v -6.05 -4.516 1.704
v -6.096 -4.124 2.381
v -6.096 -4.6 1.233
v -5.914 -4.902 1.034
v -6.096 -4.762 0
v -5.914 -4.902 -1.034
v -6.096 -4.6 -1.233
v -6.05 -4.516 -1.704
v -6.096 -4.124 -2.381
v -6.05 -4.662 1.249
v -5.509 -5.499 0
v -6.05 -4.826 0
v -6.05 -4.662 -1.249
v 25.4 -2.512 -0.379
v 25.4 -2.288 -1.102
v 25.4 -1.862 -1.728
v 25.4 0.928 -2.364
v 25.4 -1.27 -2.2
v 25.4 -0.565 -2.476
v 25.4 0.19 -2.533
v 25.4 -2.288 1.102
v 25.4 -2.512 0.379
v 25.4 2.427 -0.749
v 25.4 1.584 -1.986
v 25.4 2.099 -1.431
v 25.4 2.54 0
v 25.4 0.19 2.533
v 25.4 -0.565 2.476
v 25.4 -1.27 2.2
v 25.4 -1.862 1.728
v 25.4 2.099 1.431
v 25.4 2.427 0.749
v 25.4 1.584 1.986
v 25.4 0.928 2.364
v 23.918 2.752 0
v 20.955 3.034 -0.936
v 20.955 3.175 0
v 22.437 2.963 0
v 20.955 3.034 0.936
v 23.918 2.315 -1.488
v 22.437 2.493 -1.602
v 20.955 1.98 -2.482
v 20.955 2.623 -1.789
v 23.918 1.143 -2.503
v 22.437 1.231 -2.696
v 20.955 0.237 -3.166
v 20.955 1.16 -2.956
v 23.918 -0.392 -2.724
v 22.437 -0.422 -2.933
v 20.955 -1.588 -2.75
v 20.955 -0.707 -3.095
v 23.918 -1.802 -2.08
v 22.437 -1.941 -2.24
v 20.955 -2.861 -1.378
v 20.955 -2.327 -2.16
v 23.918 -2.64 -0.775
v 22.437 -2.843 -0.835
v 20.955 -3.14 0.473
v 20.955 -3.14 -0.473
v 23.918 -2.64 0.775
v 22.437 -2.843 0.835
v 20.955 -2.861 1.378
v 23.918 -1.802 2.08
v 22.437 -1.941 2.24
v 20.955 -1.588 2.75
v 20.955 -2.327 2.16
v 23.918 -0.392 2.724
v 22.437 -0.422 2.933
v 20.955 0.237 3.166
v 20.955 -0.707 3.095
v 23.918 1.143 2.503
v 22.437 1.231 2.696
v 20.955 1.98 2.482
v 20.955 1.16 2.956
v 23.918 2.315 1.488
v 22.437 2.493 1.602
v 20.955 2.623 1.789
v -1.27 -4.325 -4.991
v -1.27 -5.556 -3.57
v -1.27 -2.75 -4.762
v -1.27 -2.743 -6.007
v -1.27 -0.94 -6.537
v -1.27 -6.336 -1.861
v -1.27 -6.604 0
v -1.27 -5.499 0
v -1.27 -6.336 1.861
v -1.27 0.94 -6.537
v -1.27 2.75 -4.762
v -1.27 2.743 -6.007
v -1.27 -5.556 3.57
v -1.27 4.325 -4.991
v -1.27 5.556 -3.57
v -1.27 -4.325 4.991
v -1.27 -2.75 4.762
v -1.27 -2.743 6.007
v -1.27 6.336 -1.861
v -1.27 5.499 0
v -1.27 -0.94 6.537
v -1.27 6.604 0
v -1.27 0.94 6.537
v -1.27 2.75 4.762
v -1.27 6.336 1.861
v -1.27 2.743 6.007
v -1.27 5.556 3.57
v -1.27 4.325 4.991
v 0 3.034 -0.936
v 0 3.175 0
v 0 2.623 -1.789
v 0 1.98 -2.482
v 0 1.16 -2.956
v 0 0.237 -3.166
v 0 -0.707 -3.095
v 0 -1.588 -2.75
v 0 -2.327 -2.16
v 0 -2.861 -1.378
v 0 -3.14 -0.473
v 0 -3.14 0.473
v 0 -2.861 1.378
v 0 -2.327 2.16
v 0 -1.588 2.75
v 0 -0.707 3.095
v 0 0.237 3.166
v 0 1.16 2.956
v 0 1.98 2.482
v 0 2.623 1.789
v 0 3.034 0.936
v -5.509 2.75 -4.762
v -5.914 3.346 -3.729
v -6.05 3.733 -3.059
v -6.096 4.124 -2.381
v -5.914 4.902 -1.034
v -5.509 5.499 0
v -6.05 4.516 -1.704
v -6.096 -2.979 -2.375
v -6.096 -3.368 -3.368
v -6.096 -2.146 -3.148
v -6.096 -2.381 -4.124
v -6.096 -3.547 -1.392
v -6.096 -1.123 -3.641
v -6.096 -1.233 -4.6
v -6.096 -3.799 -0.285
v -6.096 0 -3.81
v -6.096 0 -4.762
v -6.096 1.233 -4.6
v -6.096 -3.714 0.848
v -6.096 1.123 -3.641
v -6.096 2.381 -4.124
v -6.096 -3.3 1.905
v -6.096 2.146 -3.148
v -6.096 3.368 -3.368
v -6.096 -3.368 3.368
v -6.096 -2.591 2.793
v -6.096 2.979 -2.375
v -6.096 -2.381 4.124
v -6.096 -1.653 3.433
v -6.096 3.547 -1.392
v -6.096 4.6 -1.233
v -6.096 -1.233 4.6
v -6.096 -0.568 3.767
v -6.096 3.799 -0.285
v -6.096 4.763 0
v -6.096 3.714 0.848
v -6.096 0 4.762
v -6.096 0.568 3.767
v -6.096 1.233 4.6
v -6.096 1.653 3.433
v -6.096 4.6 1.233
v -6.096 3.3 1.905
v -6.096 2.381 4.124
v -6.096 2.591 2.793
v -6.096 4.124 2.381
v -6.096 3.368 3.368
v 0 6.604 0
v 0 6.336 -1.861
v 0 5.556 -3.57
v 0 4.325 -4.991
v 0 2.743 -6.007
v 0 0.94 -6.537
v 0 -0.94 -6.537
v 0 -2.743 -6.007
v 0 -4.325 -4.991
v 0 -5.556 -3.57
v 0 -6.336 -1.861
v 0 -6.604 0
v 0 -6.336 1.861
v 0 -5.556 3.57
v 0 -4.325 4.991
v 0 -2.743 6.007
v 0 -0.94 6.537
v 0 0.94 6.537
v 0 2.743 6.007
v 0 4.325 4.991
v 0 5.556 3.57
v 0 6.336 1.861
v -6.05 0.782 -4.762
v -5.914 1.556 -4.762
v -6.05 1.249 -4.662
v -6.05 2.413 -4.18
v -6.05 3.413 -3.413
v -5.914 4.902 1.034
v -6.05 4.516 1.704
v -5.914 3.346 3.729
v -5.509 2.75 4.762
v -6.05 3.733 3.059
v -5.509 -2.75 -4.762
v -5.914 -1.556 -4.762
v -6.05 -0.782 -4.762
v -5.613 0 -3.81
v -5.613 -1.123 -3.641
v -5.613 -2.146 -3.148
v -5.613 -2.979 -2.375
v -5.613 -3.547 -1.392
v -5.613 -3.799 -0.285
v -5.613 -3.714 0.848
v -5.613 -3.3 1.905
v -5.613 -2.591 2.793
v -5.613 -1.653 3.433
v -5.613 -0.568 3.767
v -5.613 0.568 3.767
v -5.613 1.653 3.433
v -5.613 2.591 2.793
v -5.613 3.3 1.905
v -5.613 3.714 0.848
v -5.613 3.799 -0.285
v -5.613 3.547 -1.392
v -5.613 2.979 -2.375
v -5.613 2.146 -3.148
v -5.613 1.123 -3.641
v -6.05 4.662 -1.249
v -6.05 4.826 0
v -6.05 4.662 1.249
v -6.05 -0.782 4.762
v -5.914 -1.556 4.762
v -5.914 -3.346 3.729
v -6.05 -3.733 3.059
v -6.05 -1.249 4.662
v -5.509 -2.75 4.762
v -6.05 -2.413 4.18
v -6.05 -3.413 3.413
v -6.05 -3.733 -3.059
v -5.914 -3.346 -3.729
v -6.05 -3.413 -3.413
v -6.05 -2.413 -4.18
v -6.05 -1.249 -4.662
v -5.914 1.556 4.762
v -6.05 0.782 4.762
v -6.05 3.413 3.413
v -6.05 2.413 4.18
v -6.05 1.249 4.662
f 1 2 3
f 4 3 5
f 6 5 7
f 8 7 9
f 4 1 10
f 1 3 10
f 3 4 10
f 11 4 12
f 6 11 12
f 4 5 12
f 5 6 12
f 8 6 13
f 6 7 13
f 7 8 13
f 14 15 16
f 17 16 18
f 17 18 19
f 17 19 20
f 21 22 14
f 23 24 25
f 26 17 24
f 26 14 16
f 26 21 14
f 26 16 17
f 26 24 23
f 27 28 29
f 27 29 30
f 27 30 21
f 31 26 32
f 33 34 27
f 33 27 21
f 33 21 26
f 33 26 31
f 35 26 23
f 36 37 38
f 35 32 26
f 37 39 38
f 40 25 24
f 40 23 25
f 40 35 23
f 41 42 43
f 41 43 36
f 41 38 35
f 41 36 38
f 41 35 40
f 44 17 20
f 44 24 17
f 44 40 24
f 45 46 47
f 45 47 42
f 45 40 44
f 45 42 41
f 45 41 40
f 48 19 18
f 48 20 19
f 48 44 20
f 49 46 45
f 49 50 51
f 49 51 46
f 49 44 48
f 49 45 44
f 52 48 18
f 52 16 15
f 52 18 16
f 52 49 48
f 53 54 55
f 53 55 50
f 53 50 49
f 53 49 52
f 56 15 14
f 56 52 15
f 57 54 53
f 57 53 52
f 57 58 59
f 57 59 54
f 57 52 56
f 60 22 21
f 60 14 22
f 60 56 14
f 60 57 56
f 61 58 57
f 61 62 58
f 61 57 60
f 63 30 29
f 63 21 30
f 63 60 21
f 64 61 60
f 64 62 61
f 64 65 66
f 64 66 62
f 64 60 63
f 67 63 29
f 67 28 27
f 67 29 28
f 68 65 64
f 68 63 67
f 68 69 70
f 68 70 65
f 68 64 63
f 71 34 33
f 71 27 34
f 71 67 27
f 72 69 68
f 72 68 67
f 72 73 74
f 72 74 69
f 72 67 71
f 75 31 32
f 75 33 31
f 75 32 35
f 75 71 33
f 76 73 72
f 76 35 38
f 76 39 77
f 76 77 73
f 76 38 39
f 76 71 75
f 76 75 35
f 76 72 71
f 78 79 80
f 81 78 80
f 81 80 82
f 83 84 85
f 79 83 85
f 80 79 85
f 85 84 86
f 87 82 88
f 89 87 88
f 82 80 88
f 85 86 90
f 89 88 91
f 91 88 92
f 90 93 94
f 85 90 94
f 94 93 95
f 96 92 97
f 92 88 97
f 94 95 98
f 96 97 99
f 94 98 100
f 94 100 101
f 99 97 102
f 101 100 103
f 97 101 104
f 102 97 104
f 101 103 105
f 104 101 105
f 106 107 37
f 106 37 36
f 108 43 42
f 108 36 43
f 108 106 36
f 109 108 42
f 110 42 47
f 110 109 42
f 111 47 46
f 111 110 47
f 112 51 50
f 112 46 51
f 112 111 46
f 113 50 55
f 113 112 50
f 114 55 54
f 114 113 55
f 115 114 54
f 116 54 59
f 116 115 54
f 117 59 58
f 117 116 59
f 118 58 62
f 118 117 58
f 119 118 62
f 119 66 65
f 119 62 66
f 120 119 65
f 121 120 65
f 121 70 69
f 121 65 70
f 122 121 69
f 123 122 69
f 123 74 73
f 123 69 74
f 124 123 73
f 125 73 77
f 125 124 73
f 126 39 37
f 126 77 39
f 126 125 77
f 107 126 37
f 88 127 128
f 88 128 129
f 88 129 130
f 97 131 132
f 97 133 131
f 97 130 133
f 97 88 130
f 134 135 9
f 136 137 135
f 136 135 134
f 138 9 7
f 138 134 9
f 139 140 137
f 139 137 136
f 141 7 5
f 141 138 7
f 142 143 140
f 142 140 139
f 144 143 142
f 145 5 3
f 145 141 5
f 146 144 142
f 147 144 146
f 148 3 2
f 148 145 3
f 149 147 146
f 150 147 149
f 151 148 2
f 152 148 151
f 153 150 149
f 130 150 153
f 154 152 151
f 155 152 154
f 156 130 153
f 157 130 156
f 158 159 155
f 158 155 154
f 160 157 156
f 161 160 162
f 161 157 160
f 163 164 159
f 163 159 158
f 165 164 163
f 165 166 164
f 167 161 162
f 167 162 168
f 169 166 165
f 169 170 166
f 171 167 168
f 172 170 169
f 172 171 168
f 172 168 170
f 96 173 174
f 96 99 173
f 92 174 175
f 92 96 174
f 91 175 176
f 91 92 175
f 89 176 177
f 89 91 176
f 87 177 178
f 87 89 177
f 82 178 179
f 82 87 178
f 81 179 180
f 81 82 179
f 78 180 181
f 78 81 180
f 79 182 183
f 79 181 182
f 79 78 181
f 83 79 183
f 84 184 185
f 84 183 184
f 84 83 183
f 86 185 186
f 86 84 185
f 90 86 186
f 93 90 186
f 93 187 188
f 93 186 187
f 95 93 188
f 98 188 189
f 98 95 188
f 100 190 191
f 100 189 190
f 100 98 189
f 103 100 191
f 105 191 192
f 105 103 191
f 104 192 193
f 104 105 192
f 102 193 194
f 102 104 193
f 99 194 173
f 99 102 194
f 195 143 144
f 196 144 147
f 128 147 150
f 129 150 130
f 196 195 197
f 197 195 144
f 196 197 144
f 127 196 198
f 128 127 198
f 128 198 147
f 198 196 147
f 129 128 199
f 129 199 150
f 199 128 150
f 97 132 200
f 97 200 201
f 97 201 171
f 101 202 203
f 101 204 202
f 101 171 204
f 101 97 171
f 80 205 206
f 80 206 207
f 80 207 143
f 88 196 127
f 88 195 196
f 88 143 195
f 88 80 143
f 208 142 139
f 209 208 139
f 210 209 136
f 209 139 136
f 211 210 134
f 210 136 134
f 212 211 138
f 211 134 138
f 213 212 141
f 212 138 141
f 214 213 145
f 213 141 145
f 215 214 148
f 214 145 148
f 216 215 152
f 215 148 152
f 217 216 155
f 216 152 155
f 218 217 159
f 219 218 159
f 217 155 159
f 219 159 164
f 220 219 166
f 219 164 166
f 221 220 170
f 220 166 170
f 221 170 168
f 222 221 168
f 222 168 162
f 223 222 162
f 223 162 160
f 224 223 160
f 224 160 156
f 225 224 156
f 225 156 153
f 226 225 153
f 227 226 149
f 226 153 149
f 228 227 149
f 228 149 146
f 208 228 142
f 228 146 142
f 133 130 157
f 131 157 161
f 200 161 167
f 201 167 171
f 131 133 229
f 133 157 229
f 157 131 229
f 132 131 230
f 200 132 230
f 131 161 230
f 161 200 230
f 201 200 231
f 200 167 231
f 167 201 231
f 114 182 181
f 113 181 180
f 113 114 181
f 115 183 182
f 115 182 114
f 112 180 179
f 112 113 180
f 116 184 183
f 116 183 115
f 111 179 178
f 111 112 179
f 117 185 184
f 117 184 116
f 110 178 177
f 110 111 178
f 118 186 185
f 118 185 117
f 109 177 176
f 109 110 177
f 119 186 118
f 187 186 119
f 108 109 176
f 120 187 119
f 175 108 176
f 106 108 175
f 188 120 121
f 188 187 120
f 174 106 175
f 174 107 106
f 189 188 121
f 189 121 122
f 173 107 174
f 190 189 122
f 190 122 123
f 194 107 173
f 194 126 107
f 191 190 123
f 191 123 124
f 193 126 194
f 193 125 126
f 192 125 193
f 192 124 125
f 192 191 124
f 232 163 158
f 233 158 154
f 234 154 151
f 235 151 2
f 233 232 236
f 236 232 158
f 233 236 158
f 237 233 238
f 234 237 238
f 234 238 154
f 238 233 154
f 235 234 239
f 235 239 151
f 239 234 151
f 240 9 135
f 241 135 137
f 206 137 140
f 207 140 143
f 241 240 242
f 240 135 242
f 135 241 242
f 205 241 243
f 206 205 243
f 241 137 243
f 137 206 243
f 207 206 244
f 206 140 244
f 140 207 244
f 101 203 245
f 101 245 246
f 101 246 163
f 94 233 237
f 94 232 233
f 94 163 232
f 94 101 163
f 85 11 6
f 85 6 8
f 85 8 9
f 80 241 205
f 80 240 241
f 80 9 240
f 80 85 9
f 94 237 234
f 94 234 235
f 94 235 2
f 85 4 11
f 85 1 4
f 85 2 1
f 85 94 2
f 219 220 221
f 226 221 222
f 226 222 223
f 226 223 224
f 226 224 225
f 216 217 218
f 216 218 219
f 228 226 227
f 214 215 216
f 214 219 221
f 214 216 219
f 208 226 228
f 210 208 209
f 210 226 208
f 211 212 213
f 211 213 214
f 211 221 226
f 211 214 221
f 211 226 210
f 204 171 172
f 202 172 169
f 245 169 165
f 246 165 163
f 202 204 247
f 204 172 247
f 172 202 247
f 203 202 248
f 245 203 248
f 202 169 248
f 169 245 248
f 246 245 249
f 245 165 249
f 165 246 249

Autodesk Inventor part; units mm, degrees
ref_plane "YZ Plane" through (0, 0, 0) normal (1, 0, 0) x (0, 1, 0)
sketch "Sketch1" plane through (0, 0, 0) normal (0, 0, 1) x (1, 0, 0)
  line L0 (-1.27, 6.604) -> (-1.27, 0)
  line L1 (-1.27, 0) -> (25.4, 0)
  line L2 (25.4, 0) -> (25.4, 3.175)
  line L3 (25.4, 3.175) -> (0, 3.175)
  line L4 (0, 3.175) -> (0, 6.604)
  line L5 (-6.604, 0) -> (30.734, 0) projected
  line L6 (0, -1.3208) -> (0, 7.9248) projected
  line L7 (0, 6.604) -> (-1.27, 6.604)
  dimension "d1" = 1.27
  dimension "d2" = 6.35
  dimension "d3" = 25.4
  dimension "d22" = 13.208
revolve "Body" add sketch "Sketch1" angle 360 about axis through (-1.27, 0, 0) along (1, 0, 0)
sketch "Sketch2" plane through (-1.27, 0, 0) normal (-1, 0, 0) x (0, 0, 1)
  line L0 (0, 5.4993) -> (4.7625, 2.7496)
  line L1 (4.7625, 2.7496) -> (4.7625, -2.7496)
  line L2 (4.7625, -2.7496) -> (0, -5.4993)
  line L3 (0, -5.4993) -> (-4.7625, -2.7496)
  line L4 (-4.7625, -2.7496) -> (-4.7625, 2.7496)
  line L5 (-4.7625, 2.7496) -> (0, 5.4993)
  circle A0 centre (0, 0) radius 6.604 projected
  dimension "d11" = 9.525
extrude "Head" add sketch "Sketch2" along normal blind 4.826 contours L0 L1 L2 L3 L4 L5
ref_plane "IDS_WORKPLANE{1}" through (-6.096, 0, 0) normal (-1, 0, 0) x (0, 0, -1)
sketch "Sketch3" plane through (-6.096, 0, 0) normal (-1, 0, 0) x (0, 0, -1)
  circle A0 centre (0, 0) radius 3.81
  point P0 (0, 0)
  dimension "d15" = 7.62
extrude "Indent" cut sketch "Sketch3" against normal blind 0.4826
thread "Thread" size "1/4-20 UNC" class "2A" standard "ANSI Unified Screw Threads" length 25.4
sketch "Sketch4" plane through (0, 0, 0) normal (0, 0, 1) x (1, 0, 0)
  line L0 (-6.096, 4.7625) -> (-6.096, 5.4993)
  line L1 (-6.096, 5.4993) -> (-5.5092, 5.4993)
  line L2 (-6.096, 5.4993) -> (-6.096, 2.7496) projected
  line L3 (-7.4557, 0) -> (1.9883, 0) projected
  line L4 (-1.27, 5.4993) -> (-6.096, 5.4993) projected
  arc A0 (-5.5092, 5.4993) -> (-6.096, 4.7625) centre (0.6392, 0) ccw
  dimension "d21" = 9.525
  dimension "d23" = 8.2489
revolve "Chamfer1" cut sketch "Sketch4" angle 360 about axis through (-10, 0, 0) along (1, 0, 0)
chamfer "Chamfer2" distance 0.635 distance2 4.445 1 edges at (25.4, -3.175, 0) measured on face at (25.4, -0.5202, -0.7796)
ref_plane "Work Plane3" through (7, 0, 0) normal (0, 0, -1) x (1, 0, 0)
equation "\"d1\" = SD"
equation "\"d2\" = NND"
equation "\"d3\" = NLG"
equation "\"d22\" = SD2"
equation "\"d11\" = SW"
equation "\"d12\" = KOH"
equation "\"d15\" = SD3"
equation "\"d16\" = SB"
equation "\"d21\" = SW"
equation "\"d23\" = 0.866025 * SW"
equation "\"d6\" = GEL"
equation "\"d19\" = -0.5 * GD2 + 0.5 * NND"
equation "\"d20\" = SPTZ"
equation "\"NLG\" = 25.4"
equation "\"NND\" = 6.35"
equation "\"KOH\" = 4.826"
equation "\"GEL\" = 25.4"
equation "\"SW\" = 9.525"
equation "\"GD2\" = 5.08"
equation "\"SPTZ\" = 4.445"
equation "\"SD3\" = 0.8 * SW"
equation "\"SB\" = 0.1 * KOH"
equation "\"SD2\" = 13.208"
equation "\"SD\" = 1.27"
equation "\"GD1\" = 5.08"
equation "\"THREADDIA\" = 6.35"
equation "\"TOA\" = 30deg"
equation "\"E0\" = 10.99852"
properties part number "am-1182" material "Steel, Mild"
